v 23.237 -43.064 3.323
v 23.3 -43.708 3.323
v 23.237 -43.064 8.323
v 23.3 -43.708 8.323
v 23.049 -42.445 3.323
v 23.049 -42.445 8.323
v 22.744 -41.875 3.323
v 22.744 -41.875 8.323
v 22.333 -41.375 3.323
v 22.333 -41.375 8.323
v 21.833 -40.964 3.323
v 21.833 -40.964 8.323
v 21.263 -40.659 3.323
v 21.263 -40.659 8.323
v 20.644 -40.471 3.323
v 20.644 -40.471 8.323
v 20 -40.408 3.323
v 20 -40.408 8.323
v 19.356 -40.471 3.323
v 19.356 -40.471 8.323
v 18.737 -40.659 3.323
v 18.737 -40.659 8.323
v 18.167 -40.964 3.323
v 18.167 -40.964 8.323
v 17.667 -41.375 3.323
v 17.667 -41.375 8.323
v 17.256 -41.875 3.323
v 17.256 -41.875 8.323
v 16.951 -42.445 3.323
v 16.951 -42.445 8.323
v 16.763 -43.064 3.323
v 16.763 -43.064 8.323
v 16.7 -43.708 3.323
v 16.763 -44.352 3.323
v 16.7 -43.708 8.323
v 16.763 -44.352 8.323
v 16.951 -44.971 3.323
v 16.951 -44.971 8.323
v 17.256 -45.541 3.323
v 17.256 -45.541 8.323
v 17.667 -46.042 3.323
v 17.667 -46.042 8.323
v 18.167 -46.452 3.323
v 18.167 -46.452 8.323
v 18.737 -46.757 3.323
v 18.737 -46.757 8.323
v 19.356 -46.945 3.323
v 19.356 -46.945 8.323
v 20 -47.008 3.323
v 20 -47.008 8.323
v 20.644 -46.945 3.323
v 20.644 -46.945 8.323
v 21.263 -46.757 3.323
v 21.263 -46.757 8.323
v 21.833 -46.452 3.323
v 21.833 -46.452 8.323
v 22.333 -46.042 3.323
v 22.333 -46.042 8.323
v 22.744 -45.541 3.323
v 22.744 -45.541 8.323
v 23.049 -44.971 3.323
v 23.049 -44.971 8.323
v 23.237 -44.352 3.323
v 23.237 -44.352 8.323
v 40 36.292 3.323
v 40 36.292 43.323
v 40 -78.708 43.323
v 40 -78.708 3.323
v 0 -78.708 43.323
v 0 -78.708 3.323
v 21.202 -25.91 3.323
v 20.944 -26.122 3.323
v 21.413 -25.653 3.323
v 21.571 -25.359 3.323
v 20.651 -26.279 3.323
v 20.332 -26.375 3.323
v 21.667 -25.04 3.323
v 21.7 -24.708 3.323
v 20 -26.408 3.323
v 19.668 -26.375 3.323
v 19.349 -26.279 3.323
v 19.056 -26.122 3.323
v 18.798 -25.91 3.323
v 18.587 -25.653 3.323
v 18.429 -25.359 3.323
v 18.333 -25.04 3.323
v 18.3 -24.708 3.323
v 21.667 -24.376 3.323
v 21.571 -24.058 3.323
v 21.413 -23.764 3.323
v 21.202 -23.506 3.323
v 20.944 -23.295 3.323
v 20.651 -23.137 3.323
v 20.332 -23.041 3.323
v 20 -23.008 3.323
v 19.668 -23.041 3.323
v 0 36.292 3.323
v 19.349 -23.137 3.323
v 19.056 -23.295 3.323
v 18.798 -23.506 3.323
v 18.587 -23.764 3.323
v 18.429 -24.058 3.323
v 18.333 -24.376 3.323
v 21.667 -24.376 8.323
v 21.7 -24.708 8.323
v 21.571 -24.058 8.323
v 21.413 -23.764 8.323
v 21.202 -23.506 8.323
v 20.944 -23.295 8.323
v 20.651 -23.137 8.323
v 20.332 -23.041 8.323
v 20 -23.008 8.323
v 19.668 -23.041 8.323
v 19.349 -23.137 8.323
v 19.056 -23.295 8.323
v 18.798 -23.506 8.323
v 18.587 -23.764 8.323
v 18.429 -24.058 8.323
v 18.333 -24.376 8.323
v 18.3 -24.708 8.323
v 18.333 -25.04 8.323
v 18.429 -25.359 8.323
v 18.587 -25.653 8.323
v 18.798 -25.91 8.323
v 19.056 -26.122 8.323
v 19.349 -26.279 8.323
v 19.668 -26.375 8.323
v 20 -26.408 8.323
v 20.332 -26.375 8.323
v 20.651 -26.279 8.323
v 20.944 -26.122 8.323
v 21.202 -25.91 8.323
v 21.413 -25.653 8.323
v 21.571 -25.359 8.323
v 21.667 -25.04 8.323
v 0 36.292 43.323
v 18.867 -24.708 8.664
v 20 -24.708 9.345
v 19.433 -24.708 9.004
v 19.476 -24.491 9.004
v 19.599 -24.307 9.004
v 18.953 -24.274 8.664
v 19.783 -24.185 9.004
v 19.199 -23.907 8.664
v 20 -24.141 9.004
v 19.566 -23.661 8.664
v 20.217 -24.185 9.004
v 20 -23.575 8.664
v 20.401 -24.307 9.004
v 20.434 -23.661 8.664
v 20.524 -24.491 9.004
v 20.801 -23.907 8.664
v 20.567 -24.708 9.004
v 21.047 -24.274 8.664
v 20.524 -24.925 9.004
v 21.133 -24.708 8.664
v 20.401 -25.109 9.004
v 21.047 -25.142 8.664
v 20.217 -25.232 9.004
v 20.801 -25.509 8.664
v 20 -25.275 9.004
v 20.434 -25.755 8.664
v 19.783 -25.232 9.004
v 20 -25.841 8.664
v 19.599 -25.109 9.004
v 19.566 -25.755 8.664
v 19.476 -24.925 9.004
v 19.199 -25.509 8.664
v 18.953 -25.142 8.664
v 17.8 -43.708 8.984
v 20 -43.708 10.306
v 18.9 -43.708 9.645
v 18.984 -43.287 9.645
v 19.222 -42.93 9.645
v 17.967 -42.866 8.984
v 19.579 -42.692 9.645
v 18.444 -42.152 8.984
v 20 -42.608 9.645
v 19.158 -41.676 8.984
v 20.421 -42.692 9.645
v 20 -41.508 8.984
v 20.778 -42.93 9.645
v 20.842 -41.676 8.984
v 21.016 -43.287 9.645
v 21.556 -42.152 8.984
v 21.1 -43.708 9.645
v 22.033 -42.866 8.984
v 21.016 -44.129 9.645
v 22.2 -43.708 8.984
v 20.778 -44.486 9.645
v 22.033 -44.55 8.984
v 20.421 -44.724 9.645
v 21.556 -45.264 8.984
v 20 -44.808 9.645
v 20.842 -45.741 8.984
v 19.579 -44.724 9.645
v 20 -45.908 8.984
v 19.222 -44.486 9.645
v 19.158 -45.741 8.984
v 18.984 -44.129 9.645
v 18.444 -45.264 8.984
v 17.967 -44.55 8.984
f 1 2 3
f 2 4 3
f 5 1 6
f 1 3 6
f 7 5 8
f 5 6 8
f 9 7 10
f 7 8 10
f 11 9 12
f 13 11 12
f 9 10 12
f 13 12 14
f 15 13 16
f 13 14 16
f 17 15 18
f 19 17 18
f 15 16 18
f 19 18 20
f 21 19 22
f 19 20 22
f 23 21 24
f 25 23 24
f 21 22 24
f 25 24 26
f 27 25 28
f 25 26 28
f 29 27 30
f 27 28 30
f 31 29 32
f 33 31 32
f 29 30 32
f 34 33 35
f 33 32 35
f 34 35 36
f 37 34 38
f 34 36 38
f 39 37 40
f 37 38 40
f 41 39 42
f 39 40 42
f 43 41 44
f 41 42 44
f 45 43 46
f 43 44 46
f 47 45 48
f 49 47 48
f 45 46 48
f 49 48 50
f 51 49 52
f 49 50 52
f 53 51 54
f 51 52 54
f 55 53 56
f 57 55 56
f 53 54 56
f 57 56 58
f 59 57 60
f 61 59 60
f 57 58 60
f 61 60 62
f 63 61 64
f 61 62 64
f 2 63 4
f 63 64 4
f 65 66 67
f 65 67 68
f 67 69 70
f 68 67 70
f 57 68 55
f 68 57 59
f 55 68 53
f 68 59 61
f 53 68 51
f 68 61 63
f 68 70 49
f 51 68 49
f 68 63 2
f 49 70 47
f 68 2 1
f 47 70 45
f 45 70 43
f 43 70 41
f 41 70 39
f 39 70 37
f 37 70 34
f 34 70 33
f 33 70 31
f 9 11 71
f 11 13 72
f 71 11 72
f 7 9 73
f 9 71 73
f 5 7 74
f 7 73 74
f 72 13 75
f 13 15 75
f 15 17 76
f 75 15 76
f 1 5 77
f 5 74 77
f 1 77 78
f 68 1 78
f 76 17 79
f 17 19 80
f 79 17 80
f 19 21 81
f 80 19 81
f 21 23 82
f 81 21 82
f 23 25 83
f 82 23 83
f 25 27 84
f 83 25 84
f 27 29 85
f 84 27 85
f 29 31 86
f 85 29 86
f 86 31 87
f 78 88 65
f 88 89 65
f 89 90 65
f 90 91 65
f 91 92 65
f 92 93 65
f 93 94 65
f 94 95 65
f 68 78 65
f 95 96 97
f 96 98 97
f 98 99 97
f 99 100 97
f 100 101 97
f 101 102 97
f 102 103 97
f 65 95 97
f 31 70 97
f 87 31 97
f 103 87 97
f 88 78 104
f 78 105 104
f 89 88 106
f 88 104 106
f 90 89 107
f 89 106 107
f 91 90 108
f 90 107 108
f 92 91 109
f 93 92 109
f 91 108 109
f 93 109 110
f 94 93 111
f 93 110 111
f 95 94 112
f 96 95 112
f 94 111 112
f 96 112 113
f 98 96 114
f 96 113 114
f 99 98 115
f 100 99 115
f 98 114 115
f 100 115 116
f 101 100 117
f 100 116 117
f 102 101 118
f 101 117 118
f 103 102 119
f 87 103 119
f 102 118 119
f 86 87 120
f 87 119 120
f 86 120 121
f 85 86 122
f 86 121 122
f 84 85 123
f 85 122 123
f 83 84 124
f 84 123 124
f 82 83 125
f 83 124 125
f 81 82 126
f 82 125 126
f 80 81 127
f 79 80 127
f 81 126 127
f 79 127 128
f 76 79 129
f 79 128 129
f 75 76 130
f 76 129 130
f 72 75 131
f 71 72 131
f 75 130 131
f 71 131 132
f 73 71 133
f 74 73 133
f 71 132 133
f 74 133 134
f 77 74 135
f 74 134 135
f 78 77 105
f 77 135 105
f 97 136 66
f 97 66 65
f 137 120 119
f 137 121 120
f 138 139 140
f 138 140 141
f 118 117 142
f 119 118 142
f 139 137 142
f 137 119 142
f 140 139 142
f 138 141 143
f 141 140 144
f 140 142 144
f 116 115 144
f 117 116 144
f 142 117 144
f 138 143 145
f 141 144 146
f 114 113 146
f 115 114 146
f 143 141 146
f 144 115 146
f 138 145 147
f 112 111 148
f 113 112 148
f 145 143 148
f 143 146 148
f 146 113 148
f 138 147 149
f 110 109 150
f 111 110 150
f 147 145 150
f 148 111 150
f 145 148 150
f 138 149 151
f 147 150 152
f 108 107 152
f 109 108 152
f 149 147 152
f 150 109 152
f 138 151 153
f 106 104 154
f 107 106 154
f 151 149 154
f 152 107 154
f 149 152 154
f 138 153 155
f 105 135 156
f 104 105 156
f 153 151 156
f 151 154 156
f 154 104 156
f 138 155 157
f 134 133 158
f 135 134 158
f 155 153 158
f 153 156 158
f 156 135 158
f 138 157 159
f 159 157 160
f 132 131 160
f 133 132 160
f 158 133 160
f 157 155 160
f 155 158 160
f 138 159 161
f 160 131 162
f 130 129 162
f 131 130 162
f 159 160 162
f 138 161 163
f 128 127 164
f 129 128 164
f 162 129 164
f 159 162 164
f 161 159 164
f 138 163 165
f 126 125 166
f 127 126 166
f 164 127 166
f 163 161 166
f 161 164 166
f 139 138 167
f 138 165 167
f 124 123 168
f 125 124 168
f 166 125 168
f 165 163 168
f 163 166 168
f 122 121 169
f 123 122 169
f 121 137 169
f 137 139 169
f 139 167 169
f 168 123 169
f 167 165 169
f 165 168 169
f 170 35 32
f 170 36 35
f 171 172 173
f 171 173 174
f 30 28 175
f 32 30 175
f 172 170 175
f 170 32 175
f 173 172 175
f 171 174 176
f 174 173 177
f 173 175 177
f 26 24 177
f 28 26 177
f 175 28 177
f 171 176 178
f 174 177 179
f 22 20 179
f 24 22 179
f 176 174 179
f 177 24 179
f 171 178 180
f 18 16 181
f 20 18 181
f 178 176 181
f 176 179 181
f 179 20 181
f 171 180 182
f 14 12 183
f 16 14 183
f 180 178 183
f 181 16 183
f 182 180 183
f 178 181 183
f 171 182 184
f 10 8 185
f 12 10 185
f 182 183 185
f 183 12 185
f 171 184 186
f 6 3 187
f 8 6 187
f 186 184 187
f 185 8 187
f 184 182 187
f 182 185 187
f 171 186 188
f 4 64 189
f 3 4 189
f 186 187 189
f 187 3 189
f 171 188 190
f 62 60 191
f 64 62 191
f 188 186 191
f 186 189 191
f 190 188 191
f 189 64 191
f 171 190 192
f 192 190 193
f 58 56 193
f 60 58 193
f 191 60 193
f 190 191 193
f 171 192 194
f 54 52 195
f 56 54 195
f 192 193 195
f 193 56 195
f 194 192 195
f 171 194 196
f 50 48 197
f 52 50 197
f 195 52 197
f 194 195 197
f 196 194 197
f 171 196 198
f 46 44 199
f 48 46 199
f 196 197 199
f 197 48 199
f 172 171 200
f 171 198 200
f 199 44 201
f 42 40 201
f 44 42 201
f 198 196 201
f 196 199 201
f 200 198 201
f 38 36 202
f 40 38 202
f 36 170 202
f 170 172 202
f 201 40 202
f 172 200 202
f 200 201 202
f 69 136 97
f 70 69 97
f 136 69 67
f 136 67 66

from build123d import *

# Parameters (mm, degrees)
SKETCH_1_W            = 40
SKETCH_1_H            = 115
EXTRUDE_1_DEPTH       = 40
HOLE_WIZARD_M31_D     = 3.4
HOLE_WIZARD_M31_DEPTH = 5
HOLE_WIZARD_M31_TIP   = 1.021463052
HOLE_WIZARD_M61_D     = 6.6
HOLE_WIZARD_M61_DEPTH = 5
HOLE_WIZARD_M61_TIP   = 1.982840043


with BuildPart() as part:
    # Эскиз1 → Бобышка-Вытянуть1 (new body)
    with BuildSketch(Plane(origin=(0, 0, 0), x_dir=(0, 0, -1), z_dir=(1, 0, 0))):
        with Locations((-23.3234714, -21.208086785)):
            Rectangle(SKETCH_1_W, SKETCH_1_H)
    extrude(amount=EXTRUDE_1_DEPTH)

    # Отверстие с зазором M31
    with Locations(Plane(origin=(0, 0, 3.3234714), x_dir=(-1, 0, 0), z_dir=(0, 0, -1))):
        with Locations((-20, -24.708086785)):
            Hole(HOLE_WIZARD_M31_D / 2, depth=HOLE_WIZARD_M31_DEPTH)
            with Locations((0, 0, -(HOLE_WIZARD_M31_DEPTH + HOLE_WIZARD_M31_TIP / 2))):  # 118° drill point
                Cone(0, HOLE_WIZARD_M31_D / 2, HOLE_WIZARD_M31_TIP, mode=Mode.SUBTRACT)

    # Отверстие с зазором M61
    with Locations(Plane(origin=(0, 0, 3.3234714), x_dir=(-1, 0, 0), z_dir=(0, 0, -1))):
        with Locations((-20, -43.708086785)):
            Hole(HOLE_WIZARD_M61_D / 2, depth=HOLE_WIZARD_M61_DEPTH)
            with Locations((0, 0, -(HOLE_WIZARD_M61_DEPTH + HOLE_WIZARD_M61_TIP / 2))):  # 118° drill point
                Cone(0, HOLE_WIZARD_M61_D / 2, HOLE_WIZARD_M61_TIP, mode=Mode.SUBTRACT)


solid = part.part
